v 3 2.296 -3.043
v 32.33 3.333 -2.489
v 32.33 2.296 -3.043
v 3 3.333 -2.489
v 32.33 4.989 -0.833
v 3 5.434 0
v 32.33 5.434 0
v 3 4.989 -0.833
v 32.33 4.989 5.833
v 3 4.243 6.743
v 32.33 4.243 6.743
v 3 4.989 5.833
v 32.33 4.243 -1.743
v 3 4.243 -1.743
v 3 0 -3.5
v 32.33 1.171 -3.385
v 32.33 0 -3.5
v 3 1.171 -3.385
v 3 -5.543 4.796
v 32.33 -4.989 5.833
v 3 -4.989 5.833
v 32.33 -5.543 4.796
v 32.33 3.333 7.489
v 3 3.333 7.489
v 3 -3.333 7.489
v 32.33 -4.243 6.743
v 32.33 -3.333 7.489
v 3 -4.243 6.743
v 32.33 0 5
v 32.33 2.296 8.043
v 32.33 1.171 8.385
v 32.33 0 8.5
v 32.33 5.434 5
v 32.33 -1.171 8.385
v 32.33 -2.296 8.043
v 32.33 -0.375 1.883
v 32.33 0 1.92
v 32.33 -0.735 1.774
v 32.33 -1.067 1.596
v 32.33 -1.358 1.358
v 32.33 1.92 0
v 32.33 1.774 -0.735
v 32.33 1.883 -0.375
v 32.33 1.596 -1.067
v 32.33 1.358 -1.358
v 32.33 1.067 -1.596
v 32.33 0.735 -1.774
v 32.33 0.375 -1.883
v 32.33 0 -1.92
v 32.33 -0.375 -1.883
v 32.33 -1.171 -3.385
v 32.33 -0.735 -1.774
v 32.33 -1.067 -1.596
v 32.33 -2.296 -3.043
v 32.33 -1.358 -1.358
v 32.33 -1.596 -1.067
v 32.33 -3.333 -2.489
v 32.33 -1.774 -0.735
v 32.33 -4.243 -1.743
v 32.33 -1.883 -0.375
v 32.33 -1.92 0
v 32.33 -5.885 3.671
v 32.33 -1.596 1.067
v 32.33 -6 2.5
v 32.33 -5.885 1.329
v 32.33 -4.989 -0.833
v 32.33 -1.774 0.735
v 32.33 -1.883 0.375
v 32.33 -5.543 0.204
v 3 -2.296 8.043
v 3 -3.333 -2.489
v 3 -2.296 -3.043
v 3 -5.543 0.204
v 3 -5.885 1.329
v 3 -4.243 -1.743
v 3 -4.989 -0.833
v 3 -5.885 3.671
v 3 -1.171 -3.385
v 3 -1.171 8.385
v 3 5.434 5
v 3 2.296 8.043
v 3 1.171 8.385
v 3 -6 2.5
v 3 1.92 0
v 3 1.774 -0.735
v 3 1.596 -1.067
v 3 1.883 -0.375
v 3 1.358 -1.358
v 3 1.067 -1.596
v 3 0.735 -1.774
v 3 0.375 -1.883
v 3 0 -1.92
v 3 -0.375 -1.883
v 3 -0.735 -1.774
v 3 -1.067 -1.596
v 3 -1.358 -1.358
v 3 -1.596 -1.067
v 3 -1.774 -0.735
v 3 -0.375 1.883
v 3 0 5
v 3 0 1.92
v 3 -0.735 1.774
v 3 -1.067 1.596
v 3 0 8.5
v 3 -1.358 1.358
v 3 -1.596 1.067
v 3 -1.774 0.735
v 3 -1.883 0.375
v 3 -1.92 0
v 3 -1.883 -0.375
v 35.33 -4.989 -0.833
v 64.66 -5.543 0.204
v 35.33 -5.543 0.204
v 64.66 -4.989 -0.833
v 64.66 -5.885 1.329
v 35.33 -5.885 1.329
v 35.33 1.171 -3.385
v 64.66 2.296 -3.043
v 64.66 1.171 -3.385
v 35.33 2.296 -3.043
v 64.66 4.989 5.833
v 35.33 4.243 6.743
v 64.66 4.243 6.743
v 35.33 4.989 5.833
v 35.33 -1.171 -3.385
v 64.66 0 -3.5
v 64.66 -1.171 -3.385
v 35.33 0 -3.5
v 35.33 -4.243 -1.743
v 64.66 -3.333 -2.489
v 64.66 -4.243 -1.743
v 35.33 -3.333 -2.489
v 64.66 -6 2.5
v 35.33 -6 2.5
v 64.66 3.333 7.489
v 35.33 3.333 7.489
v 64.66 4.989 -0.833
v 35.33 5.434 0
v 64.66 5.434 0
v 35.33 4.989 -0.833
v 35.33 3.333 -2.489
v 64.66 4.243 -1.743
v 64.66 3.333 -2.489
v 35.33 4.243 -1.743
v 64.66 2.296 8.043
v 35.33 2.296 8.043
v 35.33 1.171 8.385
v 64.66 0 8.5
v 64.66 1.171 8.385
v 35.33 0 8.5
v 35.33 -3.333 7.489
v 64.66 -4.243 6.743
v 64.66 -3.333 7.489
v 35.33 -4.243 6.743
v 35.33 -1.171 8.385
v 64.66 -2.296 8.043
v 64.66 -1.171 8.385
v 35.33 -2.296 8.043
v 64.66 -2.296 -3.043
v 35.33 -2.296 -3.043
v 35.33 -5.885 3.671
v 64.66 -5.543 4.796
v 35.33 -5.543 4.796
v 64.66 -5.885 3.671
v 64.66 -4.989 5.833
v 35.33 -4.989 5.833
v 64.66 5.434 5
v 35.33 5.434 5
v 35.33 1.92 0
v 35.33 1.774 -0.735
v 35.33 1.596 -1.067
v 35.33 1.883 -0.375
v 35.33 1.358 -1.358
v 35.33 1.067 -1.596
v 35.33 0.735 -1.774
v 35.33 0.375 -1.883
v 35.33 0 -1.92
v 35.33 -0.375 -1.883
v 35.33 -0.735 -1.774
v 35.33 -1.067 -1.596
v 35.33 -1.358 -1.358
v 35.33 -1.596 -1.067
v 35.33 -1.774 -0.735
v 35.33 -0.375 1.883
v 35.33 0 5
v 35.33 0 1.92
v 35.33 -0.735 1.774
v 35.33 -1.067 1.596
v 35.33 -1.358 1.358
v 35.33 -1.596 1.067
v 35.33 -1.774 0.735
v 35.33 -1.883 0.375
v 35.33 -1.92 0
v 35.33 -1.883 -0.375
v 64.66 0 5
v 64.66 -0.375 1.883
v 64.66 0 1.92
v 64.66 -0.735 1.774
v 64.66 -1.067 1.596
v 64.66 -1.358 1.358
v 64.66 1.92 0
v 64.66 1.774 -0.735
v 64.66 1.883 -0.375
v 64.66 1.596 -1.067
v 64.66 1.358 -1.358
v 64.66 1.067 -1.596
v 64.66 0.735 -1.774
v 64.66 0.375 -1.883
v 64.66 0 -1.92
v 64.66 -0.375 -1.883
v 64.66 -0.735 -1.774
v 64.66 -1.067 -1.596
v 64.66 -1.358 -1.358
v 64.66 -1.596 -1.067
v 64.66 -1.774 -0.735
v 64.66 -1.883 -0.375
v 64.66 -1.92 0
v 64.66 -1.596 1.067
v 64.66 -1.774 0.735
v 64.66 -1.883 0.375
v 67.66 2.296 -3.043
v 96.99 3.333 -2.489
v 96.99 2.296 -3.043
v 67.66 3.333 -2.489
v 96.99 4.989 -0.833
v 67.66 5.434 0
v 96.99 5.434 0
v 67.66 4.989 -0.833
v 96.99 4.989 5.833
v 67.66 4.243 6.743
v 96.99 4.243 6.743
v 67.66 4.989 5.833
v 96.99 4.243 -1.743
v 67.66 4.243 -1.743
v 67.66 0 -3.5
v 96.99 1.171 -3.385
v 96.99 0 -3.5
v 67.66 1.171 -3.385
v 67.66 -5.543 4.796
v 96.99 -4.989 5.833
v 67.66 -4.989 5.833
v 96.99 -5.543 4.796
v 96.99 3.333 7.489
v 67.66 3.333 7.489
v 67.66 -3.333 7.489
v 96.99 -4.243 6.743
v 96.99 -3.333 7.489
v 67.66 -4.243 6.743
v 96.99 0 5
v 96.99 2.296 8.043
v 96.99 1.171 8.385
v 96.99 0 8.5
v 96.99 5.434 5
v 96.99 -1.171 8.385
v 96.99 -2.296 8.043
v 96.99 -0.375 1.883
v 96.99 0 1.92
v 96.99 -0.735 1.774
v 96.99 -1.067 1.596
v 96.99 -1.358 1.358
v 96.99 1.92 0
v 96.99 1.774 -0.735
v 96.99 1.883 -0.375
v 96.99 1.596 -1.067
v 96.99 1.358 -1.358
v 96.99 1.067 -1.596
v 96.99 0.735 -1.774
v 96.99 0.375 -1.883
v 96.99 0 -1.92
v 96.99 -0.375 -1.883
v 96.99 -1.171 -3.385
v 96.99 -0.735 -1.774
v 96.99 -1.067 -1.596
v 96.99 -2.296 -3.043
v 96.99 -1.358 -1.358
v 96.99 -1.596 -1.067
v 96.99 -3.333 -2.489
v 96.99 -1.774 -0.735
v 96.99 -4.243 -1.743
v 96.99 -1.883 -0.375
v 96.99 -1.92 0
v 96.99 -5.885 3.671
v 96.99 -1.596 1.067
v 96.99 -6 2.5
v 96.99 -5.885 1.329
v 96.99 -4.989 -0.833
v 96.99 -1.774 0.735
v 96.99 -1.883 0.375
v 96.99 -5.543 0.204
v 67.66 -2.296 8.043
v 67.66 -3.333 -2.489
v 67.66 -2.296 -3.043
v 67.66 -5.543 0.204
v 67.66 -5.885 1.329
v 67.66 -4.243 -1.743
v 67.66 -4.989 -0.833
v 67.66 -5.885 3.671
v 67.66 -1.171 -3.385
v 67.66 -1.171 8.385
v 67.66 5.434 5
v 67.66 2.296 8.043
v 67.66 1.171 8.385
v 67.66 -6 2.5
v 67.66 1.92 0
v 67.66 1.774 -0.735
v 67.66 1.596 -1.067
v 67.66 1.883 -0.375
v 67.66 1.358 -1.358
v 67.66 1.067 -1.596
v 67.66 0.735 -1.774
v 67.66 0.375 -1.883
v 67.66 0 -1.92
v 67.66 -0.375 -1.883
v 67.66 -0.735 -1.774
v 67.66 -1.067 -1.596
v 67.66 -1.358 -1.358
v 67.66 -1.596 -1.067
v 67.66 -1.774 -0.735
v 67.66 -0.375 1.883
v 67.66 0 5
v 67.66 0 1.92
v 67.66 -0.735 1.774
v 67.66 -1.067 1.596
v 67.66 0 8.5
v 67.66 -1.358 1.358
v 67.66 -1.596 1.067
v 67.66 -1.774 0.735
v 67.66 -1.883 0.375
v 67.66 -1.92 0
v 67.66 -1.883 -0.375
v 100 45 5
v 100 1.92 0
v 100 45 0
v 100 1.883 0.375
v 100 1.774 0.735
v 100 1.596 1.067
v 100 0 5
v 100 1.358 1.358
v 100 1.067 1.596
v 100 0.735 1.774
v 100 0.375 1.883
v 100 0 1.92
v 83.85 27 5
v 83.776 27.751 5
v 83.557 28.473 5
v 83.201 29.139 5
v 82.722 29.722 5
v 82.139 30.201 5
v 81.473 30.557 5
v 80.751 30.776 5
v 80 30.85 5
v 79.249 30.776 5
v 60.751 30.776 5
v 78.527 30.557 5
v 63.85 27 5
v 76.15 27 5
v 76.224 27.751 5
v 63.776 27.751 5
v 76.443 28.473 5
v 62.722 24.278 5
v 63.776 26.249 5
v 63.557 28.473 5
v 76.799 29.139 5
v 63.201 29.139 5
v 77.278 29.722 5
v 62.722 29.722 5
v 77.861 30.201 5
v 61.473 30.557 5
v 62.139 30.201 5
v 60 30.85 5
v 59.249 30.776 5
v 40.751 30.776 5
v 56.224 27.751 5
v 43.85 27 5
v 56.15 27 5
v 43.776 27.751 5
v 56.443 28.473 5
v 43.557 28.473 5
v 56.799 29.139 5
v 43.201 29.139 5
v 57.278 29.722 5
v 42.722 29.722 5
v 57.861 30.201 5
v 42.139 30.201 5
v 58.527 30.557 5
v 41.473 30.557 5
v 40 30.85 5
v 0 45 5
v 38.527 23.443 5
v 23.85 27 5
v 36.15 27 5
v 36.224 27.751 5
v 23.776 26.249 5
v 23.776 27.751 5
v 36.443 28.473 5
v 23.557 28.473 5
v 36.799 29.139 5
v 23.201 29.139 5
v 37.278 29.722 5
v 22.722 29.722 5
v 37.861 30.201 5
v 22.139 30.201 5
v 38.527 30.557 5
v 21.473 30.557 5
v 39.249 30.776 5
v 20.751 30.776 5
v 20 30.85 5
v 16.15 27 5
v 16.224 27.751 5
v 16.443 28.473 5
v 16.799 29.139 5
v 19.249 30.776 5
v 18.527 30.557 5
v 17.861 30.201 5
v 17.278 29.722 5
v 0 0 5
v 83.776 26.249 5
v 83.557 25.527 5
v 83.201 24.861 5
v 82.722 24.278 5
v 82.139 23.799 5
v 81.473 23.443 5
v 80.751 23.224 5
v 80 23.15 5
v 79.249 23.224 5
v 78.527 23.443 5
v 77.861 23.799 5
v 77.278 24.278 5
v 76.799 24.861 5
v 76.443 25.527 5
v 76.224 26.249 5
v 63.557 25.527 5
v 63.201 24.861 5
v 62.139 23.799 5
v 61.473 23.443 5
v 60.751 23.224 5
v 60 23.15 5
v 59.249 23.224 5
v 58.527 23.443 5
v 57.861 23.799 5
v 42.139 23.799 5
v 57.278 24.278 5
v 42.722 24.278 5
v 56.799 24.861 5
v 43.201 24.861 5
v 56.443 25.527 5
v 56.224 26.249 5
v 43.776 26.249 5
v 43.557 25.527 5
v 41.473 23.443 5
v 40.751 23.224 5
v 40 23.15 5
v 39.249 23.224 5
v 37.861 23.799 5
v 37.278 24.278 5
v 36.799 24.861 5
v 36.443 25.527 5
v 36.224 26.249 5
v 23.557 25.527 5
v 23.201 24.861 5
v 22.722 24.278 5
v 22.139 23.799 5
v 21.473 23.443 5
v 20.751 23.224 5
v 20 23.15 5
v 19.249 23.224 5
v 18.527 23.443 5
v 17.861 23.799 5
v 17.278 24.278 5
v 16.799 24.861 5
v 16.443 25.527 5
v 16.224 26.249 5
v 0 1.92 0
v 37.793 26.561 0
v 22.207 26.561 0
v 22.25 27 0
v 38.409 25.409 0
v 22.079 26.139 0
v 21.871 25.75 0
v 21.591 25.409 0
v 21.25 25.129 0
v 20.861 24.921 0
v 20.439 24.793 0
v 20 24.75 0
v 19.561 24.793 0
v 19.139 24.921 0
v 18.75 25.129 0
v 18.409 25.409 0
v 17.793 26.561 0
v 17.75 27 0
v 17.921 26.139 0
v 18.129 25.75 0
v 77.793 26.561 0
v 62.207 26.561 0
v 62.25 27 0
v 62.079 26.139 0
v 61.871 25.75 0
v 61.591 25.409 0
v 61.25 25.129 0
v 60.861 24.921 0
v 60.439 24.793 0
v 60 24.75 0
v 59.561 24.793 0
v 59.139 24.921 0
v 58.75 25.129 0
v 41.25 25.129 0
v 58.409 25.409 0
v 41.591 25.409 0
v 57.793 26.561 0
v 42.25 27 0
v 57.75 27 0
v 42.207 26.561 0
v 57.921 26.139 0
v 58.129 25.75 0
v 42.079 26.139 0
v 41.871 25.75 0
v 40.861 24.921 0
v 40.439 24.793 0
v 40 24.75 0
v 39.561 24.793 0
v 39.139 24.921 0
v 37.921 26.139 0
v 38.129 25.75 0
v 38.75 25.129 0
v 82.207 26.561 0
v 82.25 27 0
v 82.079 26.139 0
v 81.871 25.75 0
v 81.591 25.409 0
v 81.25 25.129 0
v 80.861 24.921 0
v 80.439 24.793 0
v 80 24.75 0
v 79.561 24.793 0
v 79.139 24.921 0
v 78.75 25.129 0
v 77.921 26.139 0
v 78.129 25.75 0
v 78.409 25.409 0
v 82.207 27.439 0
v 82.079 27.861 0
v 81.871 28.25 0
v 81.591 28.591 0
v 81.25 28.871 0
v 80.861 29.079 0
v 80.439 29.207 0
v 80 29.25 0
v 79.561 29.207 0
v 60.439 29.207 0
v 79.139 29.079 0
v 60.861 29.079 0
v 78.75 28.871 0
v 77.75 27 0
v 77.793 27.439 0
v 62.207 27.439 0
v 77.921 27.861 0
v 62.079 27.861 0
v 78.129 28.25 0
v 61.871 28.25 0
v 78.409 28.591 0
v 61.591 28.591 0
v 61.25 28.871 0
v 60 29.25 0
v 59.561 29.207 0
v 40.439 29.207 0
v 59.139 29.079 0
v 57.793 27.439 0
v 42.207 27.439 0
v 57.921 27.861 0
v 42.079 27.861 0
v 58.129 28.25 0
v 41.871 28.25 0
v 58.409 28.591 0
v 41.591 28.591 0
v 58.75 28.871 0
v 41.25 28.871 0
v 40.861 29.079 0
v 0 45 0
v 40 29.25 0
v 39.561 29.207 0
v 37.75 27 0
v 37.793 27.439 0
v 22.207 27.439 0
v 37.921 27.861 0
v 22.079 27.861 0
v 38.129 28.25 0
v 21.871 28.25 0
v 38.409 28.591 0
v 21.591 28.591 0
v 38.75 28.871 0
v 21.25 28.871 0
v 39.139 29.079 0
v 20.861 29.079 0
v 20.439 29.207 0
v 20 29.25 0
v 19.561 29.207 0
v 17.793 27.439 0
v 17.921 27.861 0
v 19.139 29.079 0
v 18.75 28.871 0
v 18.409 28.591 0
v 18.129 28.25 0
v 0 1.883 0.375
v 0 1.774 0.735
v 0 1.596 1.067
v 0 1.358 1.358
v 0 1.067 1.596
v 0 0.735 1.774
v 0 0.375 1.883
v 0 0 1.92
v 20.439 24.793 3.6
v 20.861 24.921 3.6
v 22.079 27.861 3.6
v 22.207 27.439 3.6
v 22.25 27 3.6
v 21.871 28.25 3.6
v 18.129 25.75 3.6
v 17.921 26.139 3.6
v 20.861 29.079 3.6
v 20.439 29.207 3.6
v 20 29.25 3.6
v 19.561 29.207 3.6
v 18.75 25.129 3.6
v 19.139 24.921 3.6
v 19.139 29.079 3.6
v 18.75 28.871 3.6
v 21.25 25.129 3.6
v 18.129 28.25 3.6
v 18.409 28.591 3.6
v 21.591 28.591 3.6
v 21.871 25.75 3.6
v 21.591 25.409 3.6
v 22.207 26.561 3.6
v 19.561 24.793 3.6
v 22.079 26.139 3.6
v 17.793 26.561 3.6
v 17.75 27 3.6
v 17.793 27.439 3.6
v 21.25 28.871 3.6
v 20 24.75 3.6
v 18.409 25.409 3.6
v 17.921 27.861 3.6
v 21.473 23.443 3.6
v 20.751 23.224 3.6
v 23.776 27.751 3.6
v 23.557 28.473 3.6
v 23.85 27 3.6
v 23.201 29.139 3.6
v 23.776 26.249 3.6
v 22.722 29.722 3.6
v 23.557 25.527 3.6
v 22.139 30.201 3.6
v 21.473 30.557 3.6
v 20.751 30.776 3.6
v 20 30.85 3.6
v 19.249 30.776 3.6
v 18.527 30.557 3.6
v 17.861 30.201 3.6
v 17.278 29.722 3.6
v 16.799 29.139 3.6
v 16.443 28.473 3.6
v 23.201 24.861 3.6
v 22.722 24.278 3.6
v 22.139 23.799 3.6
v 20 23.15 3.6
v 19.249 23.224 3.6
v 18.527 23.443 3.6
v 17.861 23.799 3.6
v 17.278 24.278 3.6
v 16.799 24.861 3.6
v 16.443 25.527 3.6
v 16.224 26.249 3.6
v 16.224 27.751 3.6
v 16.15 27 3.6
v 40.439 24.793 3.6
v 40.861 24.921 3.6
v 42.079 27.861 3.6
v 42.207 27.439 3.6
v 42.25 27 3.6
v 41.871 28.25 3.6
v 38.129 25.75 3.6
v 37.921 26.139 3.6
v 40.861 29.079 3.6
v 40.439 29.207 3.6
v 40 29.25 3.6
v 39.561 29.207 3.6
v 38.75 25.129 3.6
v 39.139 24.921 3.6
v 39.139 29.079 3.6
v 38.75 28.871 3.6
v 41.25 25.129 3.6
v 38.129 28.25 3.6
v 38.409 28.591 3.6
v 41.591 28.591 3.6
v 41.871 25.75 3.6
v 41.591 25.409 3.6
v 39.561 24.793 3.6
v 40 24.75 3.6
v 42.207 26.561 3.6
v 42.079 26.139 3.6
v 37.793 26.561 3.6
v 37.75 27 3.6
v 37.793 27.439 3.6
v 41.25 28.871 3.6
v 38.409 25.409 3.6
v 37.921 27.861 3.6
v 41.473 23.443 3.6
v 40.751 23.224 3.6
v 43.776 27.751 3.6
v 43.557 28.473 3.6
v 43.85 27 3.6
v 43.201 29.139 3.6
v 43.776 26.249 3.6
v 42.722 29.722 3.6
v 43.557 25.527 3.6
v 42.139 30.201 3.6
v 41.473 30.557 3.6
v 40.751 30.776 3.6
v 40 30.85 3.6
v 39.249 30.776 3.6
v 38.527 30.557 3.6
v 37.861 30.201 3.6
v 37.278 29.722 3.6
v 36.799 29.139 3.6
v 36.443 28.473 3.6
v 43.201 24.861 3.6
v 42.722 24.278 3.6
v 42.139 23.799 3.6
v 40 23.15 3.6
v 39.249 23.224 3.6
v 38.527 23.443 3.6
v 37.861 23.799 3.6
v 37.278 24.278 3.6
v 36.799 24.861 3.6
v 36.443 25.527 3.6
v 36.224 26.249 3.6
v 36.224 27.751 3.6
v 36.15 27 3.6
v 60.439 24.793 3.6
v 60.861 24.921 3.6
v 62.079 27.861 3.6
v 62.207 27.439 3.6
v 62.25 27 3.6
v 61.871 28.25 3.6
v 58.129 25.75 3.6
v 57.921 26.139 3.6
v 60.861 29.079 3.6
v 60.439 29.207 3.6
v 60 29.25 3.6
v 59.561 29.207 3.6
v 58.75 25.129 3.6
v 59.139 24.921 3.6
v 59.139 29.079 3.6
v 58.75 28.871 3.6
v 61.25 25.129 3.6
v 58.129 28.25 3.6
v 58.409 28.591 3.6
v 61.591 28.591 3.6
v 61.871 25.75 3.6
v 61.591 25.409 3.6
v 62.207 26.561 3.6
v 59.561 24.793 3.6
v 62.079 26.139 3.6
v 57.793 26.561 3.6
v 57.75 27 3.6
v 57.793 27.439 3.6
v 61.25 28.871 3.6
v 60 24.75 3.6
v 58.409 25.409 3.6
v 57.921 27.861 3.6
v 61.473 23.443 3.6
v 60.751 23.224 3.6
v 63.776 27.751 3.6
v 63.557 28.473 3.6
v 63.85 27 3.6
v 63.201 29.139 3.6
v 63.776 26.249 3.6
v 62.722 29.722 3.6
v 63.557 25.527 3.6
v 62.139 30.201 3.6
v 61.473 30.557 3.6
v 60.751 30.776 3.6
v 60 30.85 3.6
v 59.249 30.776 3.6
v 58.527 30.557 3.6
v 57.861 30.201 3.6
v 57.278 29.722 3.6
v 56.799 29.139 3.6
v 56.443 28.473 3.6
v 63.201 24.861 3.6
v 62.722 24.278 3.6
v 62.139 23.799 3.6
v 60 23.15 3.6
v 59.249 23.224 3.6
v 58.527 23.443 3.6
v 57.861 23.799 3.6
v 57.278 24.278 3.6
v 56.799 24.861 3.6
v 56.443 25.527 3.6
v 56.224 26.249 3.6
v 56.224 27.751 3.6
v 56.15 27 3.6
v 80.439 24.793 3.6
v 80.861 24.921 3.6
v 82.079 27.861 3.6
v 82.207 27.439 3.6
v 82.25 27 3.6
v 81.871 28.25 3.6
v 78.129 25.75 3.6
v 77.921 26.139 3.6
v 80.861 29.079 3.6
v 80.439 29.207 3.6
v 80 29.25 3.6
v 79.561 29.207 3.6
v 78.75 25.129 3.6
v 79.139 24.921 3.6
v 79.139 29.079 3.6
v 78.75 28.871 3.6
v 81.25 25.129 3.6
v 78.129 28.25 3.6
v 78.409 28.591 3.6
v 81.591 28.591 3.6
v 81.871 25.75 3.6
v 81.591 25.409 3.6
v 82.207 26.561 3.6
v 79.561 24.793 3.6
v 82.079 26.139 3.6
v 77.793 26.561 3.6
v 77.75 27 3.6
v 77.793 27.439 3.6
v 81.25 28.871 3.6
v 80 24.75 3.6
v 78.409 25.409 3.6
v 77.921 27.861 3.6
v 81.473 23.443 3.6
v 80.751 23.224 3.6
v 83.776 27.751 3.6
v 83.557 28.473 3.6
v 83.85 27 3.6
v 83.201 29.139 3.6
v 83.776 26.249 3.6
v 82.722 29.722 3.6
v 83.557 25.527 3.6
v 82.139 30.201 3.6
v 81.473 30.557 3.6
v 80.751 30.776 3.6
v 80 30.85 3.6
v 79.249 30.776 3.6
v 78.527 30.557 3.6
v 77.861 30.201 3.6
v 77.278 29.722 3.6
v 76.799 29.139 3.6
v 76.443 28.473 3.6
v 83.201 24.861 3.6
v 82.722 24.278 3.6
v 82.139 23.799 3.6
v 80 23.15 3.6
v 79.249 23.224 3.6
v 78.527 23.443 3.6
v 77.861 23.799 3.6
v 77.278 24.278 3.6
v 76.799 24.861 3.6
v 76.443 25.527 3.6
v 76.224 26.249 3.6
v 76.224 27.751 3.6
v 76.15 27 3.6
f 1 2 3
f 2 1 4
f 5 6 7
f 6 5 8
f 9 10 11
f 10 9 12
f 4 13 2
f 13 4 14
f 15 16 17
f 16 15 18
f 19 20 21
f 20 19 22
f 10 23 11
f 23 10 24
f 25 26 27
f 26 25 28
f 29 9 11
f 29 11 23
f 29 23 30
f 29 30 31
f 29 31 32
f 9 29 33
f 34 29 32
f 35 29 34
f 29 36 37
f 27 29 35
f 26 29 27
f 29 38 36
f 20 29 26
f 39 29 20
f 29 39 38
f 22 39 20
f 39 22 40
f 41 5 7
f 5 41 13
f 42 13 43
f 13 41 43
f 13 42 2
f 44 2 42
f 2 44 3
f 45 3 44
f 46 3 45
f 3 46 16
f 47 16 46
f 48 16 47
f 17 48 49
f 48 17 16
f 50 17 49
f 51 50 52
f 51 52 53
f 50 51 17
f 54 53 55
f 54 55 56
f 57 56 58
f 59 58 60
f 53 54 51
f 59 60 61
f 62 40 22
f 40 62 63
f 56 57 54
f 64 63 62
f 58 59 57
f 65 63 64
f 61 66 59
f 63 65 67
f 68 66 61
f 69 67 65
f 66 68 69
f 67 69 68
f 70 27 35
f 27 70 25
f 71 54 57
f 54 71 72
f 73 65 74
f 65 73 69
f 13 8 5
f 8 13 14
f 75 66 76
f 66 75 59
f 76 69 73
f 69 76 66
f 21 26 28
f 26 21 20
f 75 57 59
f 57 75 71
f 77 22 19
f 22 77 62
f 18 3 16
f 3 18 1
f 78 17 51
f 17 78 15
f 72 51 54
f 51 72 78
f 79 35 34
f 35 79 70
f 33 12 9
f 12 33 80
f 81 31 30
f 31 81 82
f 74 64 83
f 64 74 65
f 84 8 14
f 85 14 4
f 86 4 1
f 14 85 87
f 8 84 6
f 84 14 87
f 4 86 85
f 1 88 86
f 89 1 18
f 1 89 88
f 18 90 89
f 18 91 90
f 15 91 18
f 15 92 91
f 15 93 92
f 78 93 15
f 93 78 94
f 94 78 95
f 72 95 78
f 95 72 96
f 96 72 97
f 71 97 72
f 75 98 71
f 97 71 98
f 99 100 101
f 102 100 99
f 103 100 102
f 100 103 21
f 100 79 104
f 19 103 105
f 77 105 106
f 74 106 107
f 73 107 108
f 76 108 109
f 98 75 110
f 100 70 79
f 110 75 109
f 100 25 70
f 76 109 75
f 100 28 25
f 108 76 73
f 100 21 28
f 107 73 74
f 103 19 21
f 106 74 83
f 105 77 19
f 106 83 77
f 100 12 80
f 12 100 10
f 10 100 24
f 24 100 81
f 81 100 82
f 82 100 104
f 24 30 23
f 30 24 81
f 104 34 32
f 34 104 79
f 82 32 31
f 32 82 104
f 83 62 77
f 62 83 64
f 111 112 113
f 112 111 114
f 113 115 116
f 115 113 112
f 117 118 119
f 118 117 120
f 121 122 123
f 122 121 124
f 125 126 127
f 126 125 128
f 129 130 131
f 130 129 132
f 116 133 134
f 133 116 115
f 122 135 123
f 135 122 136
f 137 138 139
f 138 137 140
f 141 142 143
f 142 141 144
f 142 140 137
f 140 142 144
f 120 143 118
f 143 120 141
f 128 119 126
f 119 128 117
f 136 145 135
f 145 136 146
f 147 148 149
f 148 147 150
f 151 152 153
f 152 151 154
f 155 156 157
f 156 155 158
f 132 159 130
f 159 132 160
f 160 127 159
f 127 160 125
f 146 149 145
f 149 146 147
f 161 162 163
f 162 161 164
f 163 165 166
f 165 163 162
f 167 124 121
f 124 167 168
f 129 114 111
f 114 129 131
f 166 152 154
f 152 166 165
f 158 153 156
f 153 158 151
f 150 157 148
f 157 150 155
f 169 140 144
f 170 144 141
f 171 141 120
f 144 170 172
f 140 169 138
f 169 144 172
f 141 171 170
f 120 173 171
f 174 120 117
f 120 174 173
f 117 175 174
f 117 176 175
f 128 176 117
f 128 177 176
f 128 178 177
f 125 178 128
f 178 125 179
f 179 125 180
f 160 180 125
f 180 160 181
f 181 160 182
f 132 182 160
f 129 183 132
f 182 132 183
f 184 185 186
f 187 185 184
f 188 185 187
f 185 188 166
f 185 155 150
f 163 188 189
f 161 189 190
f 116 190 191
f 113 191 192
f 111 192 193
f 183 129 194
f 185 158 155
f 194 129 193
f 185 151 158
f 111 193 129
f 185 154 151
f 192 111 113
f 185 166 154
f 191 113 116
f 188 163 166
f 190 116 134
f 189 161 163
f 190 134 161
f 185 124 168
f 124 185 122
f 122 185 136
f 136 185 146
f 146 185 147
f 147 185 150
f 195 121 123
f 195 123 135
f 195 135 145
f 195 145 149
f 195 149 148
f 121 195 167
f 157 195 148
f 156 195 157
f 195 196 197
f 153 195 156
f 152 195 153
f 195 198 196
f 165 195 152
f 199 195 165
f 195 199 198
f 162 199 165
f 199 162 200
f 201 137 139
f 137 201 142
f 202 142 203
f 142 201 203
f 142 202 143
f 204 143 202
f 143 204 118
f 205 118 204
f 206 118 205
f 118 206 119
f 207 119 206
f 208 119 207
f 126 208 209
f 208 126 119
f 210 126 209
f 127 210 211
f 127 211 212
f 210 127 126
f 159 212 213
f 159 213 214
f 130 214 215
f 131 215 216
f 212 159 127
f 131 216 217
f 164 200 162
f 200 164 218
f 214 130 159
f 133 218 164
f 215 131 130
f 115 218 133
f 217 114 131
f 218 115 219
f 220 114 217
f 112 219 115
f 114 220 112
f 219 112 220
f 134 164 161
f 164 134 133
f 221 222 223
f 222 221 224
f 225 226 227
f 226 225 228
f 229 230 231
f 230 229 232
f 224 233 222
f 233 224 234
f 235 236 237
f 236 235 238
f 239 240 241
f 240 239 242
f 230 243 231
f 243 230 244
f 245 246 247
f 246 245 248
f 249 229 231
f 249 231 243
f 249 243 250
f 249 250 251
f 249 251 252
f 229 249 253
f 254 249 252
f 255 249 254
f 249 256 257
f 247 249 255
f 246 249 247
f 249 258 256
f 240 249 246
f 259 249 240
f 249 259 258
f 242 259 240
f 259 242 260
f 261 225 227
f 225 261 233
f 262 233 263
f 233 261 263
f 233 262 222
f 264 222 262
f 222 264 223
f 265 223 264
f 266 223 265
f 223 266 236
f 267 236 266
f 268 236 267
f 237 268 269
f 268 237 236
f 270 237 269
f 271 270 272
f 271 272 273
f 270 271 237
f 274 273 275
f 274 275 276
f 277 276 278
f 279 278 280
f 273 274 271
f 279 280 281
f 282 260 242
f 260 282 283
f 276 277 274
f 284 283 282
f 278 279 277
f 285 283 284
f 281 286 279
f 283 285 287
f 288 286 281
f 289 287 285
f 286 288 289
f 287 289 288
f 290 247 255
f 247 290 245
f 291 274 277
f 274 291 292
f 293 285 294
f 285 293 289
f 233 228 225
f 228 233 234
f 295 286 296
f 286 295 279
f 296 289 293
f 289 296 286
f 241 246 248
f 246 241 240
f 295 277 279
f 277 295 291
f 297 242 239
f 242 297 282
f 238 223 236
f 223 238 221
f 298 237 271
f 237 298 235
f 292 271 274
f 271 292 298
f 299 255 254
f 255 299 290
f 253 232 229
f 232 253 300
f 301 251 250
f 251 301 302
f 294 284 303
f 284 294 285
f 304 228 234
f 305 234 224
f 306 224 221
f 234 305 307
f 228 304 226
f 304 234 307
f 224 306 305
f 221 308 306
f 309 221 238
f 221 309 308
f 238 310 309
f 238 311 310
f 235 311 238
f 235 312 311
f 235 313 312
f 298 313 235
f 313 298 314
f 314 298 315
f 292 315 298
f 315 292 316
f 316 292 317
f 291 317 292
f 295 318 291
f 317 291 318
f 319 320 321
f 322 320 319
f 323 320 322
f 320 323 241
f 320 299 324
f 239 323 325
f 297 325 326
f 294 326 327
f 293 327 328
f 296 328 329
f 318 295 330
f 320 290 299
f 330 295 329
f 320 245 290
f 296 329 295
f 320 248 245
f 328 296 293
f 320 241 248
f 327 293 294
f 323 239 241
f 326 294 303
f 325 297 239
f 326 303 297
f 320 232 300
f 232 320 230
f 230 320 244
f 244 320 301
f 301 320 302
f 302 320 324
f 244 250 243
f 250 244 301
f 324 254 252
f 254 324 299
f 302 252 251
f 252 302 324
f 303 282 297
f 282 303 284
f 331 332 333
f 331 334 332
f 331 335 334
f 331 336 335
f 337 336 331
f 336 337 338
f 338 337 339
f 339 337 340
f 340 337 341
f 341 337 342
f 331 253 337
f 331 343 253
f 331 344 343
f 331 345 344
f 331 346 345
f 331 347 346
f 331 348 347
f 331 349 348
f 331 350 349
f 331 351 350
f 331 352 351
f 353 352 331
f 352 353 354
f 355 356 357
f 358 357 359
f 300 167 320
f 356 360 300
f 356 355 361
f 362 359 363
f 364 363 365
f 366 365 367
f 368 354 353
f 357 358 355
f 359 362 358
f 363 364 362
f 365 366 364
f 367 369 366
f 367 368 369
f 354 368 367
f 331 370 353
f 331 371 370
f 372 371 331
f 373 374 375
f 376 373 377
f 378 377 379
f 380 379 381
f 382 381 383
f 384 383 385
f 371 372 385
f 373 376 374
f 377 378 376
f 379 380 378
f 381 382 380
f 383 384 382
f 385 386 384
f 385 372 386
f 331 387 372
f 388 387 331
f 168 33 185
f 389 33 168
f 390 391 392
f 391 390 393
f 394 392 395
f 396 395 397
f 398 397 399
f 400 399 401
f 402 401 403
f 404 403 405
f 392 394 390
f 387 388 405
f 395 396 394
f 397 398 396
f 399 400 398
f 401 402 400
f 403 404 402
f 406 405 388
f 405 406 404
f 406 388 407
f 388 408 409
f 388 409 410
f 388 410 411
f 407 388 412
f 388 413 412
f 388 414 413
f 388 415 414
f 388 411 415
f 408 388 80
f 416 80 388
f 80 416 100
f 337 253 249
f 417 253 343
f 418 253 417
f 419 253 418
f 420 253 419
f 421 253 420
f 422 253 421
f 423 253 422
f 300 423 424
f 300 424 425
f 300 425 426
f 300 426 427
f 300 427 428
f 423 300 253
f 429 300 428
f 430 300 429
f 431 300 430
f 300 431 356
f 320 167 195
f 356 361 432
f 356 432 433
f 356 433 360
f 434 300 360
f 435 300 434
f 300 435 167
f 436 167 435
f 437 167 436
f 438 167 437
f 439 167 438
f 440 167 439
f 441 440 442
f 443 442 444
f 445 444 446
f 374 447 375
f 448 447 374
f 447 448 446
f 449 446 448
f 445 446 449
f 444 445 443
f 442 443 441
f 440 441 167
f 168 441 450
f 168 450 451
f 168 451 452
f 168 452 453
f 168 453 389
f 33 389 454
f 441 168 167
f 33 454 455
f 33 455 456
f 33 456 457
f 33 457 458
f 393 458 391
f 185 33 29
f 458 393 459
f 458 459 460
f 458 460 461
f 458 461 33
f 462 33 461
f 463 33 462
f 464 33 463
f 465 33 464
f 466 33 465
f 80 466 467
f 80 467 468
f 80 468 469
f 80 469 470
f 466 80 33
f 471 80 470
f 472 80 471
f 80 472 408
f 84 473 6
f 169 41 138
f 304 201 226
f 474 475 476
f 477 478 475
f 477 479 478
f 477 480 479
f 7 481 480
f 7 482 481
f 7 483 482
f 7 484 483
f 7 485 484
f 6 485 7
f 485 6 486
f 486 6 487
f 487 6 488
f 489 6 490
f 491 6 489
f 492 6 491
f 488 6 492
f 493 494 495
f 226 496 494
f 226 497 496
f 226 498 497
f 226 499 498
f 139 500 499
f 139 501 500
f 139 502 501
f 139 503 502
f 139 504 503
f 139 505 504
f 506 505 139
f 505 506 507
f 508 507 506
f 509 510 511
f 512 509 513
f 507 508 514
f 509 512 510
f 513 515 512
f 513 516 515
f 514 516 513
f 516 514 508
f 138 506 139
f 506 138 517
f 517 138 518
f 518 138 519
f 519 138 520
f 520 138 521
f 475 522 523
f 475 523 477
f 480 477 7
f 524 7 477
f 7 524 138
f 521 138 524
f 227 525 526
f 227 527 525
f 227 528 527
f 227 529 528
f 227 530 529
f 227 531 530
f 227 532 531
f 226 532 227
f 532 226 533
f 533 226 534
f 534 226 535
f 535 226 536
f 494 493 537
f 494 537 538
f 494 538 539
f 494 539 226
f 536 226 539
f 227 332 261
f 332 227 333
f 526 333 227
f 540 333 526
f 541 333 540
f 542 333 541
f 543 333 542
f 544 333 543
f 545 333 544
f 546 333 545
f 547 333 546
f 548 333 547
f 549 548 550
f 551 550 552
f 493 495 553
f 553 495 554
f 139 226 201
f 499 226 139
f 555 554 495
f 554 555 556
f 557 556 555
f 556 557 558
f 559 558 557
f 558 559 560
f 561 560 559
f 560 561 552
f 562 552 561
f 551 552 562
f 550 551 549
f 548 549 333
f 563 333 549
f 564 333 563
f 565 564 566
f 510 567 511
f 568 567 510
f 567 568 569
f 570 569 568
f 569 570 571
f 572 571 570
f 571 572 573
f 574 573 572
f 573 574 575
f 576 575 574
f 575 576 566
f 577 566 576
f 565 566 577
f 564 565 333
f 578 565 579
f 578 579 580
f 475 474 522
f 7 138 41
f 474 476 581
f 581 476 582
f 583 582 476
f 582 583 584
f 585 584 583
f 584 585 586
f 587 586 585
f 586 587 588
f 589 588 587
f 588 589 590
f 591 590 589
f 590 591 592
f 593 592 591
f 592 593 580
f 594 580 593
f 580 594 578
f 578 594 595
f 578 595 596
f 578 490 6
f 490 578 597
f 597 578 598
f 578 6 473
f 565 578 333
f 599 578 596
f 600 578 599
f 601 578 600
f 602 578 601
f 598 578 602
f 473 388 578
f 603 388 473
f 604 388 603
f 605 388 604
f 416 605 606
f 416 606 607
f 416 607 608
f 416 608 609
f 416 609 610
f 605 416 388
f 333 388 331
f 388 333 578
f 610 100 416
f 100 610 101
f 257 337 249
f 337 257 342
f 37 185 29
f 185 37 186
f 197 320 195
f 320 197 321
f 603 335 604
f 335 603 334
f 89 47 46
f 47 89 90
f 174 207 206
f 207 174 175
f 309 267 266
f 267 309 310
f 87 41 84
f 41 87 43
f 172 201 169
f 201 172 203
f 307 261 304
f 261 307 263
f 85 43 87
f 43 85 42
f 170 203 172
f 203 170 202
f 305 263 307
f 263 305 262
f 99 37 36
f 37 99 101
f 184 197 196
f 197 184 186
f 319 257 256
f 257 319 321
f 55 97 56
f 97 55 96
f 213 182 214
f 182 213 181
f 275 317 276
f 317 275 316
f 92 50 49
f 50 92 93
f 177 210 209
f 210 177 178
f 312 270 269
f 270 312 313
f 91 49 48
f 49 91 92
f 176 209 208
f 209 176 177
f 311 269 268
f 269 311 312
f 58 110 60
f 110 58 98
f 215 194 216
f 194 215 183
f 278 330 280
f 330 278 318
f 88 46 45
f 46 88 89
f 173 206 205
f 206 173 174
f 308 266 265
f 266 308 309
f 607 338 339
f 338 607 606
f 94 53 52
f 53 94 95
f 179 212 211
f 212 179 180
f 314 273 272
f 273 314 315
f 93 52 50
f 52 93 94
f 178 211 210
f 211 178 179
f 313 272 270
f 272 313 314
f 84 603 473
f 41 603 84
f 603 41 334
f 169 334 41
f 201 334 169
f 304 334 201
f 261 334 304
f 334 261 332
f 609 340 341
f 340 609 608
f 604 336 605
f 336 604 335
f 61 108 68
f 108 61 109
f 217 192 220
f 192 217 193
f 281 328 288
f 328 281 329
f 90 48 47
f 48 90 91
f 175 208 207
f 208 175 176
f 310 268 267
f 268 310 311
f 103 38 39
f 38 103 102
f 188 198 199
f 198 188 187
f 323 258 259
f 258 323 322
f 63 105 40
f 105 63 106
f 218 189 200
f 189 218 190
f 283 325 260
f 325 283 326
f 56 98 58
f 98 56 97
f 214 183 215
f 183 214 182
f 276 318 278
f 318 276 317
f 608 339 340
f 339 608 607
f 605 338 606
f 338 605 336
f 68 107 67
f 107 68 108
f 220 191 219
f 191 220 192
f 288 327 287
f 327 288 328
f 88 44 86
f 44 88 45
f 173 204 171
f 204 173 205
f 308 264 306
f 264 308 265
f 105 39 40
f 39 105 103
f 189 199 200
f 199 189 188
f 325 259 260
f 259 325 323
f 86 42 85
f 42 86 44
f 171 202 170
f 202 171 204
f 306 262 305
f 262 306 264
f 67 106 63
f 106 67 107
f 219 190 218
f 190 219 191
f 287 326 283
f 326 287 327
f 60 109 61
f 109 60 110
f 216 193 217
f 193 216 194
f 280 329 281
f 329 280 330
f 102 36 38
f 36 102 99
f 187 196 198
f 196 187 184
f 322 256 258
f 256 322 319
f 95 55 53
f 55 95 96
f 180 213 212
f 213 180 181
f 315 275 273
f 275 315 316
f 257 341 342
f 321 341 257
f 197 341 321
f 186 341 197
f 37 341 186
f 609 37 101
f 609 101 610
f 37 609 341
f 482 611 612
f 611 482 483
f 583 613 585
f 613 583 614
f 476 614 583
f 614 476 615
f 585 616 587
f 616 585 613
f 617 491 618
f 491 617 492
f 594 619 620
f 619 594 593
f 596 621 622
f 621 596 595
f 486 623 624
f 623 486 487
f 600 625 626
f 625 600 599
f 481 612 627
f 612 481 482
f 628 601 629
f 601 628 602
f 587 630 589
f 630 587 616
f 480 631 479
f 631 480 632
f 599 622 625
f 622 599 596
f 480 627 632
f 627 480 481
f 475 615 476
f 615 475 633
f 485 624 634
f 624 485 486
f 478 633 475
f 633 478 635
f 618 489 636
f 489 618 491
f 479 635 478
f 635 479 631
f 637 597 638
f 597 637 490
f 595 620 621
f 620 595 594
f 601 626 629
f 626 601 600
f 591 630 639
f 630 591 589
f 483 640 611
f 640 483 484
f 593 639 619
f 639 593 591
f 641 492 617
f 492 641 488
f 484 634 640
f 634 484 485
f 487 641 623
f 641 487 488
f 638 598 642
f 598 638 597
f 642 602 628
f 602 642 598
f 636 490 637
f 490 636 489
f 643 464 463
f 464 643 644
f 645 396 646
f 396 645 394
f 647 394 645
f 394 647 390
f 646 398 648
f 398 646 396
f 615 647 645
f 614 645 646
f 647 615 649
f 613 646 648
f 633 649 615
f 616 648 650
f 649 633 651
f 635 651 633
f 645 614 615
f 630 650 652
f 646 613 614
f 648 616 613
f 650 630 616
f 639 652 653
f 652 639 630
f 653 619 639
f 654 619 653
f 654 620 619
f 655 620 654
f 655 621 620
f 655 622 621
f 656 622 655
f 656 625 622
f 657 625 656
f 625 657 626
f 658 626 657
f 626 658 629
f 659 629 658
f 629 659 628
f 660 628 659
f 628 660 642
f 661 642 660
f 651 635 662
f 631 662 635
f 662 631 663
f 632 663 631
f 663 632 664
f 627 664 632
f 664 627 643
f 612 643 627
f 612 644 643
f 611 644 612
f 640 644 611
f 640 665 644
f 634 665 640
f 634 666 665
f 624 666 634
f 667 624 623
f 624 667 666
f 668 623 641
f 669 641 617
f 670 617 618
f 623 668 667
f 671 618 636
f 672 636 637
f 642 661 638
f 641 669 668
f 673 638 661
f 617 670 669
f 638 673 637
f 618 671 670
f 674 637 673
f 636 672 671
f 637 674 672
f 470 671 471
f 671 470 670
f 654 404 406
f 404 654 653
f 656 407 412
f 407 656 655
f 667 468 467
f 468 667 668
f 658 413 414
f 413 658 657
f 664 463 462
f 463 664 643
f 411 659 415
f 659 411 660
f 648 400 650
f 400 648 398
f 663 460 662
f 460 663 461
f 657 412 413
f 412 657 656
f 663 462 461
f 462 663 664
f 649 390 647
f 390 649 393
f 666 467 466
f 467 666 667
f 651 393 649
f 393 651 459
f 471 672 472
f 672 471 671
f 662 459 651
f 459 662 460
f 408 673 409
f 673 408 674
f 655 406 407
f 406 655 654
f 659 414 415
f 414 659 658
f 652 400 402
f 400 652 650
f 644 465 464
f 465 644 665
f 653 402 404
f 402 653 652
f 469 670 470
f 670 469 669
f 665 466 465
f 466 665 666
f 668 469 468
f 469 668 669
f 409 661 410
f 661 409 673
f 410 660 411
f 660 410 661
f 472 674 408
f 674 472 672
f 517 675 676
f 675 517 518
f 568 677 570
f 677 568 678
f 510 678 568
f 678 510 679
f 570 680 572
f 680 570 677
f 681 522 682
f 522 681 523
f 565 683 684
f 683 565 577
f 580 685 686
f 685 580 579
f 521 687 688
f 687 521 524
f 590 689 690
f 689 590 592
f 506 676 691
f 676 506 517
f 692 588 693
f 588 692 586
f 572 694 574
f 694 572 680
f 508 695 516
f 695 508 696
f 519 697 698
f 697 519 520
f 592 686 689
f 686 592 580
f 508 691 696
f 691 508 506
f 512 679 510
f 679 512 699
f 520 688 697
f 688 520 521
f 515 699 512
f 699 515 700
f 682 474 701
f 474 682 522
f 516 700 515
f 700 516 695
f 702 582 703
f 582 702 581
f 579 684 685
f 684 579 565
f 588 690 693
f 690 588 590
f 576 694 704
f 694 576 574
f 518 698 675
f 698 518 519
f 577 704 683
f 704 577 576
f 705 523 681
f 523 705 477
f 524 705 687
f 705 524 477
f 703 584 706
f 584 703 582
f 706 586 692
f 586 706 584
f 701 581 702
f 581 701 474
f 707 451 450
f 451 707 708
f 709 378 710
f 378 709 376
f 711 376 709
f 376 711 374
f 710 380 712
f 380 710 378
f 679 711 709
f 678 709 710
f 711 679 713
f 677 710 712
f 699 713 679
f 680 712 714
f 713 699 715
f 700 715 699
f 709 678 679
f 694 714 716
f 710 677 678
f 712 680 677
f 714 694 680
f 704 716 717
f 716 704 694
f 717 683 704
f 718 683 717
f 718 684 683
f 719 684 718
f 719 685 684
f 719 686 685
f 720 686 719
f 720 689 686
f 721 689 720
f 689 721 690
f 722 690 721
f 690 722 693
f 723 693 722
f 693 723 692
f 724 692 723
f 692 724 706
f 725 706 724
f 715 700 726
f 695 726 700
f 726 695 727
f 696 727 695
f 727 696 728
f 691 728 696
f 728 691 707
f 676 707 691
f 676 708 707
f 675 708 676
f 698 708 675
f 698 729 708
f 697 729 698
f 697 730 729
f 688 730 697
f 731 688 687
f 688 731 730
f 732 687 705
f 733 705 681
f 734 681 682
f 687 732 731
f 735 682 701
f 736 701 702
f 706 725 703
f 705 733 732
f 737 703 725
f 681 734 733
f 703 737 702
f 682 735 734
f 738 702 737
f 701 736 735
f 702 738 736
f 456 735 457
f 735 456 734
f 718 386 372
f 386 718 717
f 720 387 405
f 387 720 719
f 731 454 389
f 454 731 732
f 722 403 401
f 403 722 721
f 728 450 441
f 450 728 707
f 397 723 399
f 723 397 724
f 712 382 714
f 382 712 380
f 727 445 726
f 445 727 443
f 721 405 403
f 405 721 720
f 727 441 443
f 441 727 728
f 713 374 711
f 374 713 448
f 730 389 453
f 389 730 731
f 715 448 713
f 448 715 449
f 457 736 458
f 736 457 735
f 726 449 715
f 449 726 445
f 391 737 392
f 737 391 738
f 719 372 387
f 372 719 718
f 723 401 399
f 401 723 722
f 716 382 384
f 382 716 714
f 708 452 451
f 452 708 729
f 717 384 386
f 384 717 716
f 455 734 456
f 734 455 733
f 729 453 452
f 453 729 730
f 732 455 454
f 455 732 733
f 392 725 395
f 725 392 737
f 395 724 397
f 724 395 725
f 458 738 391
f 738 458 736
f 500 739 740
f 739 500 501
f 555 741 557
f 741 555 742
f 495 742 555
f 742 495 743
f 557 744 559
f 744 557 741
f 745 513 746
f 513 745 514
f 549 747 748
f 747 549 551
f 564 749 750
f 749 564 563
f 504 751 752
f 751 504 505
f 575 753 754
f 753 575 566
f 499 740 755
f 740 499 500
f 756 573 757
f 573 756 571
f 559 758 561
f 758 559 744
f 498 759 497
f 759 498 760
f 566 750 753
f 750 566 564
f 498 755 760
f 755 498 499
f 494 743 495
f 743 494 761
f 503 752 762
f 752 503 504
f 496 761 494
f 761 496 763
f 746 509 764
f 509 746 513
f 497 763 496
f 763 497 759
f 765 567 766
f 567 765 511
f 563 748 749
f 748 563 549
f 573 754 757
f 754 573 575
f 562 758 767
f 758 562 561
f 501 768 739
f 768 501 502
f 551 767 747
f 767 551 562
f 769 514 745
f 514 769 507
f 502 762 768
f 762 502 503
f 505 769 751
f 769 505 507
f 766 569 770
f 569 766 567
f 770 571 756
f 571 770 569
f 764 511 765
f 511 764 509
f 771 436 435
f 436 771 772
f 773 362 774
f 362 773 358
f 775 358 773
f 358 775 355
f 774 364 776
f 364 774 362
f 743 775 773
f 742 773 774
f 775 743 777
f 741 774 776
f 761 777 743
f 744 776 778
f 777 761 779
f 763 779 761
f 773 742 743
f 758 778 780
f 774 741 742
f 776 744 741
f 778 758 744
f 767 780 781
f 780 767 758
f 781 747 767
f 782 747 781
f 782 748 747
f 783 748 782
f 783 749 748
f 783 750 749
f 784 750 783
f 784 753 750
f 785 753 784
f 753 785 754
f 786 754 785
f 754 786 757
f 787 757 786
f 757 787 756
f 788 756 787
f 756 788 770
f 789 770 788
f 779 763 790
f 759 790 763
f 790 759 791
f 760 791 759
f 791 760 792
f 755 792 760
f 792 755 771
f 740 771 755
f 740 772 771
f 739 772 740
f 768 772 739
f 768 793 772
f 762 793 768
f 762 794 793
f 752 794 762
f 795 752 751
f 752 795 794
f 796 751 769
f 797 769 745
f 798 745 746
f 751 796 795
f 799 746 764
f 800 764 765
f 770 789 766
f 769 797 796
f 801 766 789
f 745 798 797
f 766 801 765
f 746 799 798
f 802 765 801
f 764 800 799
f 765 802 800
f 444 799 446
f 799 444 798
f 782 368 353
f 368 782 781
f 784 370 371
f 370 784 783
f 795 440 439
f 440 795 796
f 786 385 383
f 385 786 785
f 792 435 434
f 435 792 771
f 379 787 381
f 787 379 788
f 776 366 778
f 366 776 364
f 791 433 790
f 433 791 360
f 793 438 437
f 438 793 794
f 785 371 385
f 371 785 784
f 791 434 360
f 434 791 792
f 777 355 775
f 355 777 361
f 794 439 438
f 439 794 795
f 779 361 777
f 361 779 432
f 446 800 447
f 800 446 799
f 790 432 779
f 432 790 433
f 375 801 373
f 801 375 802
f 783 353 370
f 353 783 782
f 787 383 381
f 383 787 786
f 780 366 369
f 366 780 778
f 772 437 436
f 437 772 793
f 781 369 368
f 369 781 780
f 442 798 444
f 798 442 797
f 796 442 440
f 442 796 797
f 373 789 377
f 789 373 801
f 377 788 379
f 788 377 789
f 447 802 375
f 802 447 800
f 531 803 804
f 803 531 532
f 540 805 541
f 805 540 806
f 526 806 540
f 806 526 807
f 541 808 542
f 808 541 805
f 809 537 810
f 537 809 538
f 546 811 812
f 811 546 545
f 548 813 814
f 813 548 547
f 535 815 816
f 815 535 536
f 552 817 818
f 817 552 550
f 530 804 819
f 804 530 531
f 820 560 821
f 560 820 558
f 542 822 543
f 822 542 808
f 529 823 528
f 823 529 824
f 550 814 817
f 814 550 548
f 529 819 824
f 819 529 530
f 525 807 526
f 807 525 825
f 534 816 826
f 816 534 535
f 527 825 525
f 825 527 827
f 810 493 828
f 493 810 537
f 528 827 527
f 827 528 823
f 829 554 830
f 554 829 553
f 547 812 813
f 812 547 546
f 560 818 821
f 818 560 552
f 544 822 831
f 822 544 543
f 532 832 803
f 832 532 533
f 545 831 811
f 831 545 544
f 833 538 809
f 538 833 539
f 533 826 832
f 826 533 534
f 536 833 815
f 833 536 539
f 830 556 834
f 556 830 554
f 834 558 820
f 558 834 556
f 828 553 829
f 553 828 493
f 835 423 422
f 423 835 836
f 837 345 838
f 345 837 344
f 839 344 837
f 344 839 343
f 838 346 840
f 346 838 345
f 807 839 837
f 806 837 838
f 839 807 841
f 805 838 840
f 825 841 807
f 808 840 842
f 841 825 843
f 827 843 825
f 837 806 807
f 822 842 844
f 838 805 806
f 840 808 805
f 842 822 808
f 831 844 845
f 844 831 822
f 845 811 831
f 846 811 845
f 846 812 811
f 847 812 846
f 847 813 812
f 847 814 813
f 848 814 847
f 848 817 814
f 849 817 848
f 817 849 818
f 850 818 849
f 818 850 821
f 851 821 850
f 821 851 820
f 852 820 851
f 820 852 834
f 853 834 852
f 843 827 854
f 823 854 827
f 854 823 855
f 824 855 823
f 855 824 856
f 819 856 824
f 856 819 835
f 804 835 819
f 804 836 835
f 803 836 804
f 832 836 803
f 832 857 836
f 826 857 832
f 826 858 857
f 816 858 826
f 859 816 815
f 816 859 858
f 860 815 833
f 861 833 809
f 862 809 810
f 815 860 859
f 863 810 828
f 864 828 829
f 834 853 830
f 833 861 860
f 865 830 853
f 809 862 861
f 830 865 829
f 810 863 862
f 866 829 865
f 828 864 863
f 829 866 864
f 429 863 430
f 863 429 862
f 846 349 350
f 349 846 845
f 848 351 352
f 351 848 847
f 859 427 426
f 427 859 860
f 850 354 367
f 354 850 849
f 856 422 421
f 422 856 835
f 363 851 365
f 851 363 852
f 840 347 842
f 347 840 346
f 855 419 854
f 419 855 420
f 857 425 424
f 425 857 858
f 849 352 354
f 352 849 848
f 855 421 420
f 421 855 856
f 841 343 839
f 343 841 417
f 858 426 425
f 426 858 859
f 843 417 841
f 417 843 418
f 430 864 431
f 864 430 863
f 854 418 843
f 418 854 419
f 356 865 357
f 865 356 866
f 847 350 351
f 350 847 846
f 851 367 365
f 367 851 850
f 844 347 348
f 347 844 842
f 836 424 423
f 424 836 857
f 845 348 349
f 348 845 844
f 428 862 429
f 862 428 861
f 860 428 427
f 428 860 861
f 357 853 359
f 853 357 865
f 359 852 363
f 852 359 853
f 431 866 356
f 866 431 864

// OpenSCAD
$fn = 32;

// ----------------------------------------------------------------------
// Hinge leaf: 100 x 51 x 12 mm
// ----------------------------------------------------------------------

// --- parameters (mm) ---
plate_len = 100;          // leaf length, X
plate_w = 45;             // leaf width, Y
plate_t = 5;              // leaf thickness
barrel_d = 12;            // knuckle diameter
barrel_w = 29.33;         // knuckle width
knuckle_n = 3;            // number of knuckles
pin_d = 3.84;             // pin bore
gap = 3;                  // gap between the knuckles
screw_d = 4.5;            // screw clearance
cs_d = 7.7;               // countersink diameter
cs_h = 1.4;               // countersink depth

module leaf() {
  cube([plate_len, plate_w, plate_t]);
}

module knuckles() {
  /* barrels sit on the leaf edge, the pin axis at half the leaf thickness */
  for (i = [0 : knuckle_n - 1])
    translate([gap + i * (barrel_w + gap), 0, plate_t * 0.5])
      rotate([0, 90, 0]) cylinder(h = barrel_w, d = barrel_d);
}

difference() {
  union() {
    leaf();
    knuckles();
  }
  rotate([0, 90, 0]) translate([0, 0, -1])
    cylinder(h = plate_len + 2, d = pin_d);
  translate([20, plate_w * 0.6, -1]) cylinder(h = plate_t + 2, d = screw_d);
  translate([20, plate_w * 0.6, plate_t - cs_h]) cylinder(h = cs_h + 0.5, d = cs_d);
  translate([40, plate_w * 0.6, -1]) cylinder(h = plate_t + 2, d = screw_d);
  translate([40, plate_w * 0.6, plate_t - cs_h]) cylinder(h = cs_h + 0.5, d = cs_d);
  translate([60, plate_w * 0.6, -1]) cylinder(h = plate_t + 2, d = screw_d);
  translate([60, plate_w * 0.6, plate_t - cs_h]) cylinder(h = cs_h + 0.5, d = cs_d);
  translate([80, plate_w * 0.6, -1]) cylinder(h = plate_t + 2, d = screw_d);
  translate([80, plate_w * 0.6, plate_t - cs_h]) cylinder(h = cs_h + 0.5, d = cs_d);
}
